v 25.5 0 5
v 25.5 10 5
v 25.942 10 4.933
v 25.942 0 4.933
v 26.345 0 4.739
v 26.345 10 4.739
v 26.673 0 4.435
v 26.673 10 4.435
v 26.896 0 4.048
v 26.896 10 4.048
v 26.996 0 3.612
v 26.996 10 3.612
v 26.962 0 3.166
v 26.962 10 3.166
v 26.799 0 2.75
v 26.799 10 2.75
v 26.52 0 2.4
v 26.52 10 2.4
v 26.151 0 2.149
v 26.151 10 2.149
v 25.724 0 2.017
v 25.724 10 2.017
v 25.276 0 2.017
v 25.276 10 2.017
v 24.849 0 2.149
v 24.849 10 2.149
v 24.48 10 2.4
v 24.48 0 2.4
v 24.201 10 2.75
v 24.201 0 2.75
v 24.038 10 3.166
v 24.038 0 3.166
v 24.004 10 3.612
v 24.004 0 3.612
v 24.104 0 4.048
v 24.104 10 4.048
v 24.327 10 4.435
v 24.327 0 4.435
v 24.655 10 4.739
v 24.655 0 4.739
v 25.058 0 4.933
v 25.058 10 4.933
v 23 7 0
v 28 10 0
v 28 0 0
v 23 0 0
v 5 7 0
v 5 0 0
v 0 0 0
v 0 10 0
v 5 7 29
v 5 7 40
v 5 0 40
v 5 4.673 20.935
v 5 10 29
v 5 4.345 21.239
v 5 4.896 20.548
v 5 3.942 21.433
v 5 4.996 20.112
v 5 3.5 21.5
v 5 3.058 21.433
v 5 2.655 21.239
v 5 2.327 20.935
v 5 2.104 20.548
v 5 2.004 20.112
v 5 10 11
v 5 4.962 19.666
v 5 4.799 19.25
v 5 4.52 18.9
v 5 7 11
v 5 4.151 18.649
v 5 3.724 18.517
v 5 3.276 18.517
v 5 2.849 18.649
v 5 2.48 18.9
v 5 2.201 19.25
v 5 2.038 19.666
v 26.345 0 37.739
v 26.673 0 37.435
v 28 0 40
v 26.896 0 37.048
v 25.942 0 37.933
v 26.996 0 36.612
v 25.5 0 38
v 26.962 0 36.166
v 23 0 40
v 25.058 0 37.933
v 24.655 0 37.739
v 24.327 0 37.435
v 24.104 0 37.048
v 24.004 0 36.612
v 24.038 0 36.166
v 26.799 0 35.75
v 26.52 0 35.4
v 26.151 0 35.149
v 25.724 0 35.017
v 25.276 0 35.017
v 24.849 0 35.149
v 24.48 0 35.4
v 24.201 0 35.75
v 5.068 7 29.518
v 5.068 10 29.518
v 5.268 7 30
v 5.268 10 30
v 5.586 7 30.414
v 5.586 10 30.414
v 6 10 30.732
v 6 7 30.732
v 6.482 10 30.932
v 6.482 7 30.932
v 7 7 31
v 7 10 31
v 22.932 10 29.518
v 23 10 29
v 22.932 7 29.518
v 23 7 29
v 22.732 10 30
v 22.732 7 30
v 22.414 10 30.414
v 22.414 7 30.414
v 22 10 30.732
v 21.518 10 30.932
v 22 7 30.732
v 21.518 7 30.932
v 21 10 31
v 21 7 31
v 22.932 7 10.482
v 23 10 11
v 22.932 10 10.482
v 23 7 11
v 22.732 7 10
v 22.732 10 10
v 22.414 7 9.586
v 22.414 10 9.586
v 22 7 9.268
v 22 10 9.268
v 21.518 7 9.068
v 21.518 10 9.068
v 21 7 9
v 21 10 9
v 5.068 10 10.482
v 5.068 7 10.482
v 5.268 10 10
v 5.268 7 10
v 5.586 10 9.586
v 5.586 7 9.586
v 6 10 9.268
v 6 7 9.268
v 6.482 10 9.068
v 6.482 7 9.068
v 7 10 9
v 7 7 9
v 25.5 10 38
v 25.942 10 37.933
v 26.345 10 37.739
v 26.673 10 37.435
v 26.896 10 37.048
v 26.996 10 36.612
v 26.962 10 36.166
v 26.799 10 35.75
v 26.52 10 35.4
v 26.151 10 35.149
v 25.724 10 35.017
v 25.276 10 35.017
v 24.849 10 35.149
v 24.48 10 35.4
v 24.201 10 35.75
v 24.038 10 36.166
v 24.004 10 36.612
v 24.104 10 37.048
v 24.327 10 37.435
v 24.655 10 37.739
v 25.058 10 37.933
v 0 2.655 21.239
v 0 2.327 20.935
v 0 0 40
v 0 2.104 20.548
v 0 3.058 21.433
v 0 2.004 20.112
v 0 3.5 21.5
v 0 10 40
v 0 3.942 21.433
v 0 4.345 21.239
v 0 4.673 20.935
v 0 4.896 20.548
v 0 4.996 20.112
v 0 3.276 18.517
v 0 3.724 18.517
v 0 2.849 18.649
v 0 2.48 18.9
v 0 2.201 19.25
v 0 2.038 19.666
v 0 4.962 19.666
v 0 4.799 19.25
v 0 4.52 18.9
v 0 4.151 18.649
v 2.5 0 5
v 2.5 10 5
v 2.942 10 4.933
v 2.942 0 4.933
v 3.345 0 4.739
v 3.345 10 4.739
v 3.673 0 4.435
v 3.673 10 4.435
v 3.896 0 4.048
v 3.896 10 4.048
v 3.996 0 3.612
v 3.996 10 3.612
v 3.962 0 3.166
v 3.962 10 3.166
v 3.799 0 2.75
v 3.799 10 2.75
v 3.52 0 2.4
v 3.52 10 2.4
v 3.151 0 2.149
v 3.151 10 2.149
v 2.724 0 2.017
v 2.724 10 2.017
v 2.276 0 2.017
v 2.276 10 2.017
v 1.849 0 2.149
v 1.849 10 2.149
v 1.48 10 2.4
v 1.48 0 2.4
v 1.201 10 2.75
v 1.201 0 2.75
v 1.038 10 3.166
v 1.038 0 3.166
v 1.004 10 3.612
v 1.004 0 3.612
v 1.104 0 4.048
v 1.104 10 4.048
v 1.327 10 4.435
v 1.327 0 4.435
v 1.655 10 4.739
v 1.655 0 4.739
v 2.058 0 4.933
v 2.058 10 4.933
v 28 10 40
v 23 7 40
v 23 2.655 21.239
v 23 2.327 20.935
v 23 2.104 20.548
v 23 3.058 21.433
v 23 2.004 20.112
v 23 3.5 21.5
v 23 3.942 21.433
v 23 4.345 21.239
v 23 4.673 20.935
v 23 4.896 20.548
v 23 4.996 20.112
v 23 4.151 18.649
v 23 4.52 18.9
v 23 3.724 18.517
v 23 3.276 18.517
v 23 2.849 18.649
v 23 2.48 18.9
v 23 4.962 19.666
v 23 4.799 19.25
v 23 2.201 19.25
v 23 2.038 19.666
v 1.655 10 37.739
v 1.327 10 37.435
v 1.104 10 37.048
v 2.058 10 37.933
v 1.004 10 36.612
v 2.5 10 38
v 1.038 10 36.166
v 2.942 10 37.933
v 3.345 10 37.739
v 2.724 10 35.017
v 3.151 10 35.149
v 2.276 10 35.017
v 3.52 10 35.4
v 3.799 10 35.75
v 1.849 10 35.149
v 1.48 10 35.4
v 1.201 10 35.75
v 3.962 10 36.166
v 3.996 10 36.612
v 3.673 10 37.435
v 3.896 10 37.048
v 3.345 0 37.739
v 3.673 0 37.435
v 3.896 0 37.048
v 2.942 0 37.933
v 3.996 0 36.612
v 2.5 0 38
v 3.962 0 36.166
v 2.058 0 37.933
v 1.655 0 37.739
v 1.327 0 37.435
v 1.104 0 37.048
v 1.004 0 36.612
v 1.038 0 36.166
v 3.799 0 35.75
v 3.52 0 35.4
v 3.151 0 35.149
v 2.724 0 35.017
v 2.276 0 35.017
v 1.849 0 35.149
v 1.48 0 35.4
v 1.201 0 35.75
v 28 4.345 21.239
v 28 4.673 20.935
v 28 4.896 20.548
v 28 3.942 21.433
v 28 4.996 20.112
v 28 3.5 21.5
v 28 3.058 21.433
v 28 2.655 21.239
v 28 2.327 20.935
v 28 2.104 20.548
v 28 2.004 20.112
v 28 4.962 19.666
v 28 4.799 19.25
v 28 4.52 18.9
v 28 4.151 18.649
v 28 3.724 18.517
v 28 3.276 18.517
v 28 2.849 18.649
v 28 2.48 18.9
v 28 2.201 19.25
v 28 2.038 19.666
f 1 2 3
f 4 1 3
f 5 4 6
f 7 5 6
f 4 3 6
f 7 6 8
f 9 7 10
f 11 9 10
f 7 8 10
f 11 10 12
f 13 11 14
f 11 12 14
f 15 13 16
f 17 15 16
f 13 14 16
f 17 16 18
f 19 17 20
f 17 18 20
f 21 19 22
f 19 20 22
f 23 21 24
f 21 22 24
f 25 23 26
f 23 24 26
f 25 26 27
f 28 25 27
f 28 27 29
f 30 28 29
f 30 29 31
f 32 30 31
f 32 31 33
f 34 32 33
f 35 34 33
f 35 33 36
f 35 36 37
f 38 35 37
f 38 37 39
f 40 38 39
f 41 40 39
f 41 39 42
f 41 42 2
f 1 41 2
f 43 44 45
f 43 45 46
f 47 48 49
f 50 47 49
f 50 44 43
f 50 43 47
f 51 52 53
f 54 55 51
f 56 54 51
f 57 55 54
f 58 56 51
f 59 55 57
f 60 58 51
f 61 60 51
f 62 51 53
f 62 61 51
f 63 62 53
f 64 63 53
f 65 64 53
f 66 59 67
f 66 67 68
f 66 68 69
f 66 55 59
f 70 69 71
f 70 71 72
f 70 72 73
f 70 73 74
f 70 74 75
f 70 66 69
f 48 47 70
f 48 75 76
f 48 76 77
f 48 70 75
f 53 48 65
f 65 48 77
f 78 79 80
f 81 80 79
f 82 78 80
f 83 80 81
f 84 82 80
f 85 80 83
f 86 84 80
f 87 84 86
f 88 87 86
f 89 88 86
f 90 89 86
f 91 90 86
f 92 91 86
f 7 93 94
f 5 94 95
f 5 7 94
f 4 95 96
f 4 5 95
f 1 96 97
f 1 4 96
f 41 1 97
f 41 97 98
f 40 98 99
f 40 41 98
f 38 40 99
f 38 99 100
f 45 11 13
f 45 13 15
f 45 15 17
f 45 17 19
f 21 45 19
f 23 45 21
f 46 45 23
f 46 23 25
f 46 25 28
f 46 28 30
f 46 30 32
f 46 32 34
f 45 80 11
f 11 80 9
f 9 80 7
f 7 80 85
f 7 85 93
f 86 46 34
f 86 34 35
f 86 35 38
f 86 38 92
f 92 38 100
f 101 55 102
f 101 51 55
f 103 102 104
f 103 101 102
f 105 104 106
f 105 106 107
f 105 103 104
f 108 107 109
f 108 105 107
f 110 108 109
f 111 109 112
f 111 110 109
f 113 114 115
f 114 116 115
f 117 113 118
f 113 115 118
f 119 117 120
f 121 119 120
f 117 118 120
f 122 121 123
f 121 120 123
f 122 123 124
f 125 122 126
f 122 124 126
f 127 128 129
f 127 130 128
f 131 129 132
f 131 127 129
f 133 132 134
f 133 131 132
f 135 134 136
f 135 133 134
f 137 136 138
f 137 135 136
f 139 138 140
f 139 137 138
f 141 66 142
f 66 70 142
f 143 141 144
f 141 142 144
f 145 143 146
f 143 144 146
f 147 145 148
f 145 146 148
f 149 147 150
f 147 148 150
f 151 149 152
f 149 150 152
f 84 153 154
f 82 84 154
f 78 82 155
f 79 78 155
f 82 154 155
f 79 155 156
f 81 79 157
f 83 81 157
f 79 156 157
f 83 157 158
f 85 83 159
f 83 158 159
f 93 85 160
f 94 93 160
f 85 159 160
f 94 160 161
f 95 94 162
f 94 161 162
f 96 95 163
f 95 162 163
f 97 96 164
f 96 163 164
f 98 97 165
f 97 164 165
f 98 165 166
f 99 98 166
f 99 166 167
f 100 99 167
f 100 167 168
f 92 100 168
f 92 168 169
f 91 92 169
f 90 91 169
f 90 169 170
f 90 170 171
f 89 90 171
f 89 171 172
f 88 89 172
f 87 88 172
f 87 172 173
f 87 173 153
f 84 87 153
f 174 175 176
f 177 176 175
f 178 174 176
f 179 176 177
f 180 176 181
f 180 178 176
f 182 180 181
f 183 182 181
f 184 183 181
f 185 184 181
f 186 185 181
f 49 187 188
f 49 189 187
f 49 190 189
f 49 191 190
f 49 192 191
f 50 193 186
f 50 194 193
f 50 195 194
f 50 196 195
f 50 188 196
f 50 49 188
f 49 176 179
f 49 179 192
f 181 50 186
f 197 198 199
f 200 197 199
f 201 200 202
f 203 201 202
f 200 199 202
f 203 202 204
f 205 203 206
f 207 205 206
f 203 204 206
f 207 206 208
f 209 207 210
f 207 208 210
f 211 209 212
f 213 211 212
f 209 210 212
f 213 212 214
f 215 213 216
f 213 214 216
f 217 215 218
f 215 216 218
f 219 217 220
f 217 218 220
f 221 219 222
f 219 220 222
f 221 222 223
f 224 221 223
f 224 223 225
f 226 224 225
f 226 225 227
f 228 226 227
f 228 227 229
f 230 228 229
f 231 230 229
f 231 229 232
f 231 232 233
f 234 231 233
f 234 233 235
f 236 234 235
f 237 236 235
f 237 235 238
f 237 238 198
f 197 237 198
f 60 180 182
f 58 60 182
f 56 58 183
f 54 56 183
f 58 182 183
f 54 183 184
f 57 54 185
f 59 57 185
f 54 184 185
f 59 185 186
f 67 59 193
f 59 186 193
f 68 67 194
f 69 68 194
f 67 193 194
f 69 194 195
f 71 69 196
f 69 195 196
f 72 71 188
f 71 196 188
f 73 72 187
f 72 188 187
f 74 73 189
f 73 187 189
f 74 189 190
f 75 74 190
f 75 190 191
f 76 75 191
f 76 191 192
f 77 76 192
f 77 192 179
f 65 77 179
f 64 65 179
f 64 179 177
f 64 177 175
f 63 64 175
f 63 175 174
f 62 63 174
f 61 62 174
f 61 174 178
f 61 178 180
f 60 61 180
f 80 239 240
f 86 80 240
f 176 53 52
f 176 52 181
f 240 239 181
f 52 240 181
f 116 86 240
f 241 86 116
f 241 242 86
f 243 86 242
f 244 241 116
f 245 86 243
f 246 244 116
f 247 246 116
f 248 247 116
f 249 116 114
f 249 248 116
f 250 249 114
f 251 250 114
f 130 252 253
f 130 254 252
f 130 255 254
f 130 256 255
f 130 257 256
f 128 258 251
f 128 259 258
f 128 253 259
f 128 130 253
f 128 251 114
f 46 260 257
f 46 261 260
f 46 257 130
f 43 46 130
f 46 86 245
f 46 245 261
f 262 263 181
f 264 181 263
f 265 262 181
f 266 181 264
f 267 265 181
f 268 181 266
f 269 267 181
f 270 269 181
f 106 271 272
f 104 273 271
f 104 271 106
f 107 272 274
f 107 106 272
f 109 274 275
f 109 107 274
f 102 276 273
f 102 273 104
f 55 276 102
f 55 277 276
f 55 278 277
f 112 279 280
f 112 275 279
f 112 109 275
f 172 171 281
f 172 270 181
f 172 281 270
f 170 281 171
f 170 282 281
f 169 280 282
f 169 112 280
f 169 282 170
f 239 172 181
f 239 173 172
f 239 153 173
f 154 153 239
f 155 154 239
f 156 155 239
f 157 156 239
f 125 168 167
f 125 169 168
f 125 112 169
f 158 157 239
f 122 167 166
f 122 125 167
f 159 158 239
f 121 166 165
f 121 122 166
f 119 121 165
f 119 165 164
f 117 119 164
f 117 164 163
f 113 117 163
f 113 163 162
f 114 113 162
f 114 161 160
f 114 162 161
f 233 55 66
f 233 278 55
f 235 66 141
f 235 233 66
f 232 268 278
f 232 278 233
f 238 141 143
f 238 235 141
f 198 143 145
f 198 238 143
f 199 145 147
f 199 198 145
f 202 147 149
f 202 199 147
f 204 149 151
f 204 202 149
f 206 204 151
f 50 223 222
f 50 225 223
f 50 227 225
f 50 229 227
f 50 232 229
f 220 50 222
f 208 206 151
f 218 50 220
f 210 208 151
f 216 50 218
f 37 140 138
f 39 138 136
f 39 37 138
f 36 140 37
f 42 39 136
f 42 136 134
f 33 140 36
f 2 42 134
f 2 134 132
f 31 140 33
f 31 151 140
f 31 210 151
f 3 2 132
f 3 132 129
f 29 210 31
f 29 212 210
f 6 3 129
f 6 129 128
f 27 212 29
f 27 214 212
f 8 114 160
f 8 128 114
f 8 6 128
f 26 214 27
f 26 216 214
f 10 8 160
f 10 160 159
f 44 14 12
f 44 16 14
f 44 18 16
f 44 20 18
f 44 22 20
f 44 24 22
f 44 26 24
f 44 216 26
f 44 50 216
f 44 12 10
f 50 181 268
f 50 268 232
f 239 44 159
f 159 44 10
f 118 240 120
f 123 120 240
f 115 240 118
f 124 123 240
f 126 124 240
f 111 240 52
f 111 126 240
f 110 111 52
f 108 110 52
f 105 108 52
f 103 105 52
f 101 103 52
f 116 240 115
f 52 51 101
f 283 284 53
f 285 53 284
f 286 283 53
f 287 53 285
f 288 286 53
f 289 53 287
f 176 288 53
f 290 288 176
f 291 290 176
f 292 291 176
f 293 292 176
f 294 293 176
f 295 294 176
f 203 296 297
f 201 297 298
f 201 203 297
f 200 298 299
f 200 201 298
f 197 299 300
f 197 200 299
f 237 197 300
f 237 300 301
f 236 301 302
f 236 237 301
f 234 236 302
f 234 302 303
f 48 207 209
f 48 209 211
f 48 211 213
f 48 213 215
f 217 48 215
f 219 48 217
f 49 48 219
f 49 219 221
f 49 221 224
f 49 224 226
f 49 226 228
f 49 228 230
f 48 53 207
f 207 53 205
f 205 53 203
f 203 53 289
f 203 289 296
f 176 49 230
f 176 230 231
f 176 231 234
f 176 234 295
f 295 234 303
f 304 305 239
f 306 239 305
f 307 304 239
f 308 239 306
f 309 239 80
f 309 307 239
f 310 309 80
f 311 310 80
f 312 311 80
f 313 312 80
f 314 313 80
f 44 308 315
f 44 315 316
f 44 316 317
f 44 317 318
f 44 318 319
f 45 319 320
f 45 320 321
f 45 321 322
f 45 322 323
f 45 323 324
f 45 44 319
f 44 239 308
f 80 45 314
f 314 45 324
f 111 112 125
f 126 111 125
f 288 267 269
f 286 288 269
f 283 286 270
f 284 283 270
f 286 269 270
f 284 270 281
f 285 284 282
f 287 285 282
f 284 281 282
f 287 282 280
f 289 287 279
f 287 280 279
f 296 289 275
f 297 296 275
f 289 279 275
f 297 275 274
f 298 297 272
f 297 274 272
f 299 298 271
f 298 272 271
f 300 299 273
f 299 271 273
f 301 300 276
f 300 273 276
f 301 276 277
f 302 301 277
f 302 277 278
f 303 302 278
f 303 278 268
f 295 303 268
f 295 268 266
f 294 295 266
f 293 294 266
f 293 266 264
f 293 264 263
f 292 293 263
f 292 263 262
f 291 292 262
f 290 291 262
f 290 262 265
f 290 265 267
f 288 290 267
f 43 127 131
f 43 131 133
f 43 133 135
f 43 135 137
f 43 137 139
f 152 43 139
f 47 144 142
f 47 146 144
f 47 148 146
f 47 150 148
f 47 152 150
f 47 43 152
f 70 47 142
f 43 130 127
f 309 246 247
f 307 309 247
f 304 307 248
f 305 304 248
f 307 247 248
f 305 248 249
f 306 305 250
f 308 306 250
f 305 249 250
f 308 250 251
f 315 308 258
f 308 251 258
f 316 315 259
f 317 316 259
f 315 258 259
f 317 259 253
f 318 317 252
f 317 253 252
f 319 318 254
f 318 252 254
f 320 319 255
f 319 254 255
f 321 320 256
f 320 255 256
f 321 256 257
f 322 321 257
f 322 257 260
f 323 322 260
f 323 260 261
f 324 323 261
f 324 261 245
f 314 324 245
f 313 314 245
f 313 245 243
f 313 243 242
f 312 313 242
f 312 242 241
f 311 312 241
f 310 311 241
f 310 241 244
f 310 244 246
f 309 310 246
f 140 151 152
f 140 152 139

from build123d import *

# Parameters (mm, degrees)
EXTRUDE_1_DEPTH     = 40
SKETCH_2_R          = 1.5
CUT_EXTRUDE_1_DEPTH = 40
SKETCH_3_R          = 1.5
CUT_EXTRUDE_2_DEPTH = 40
SKETCH_5_W          = 18
SKETCH_5_H          = 22
CUT_EXTRUDE_3_DEPTH = 50.839743178
FILLET_3_R          = 2


with BuildPart() as part:
    # 草图1 → 凸台-拉伸1 (new body)
    with BuildSketch(Plane.XY):
        Polygon((0, 0), (0, 10), (28, 10), (28, 0), (23, 0), (23, 7), (5, 7), (5, 0), align=None)
    extrude(amount=EXTRUDE_1_DEPTH)

    # 草图2 → 切除-拉伸1 (cut)
    with BuildSketch(Plane(origin=(0, 10, 0), x_dir=(1, 0, 0), z_dir=(0, 1, 0))):
        with Locations(Location((2.5, -3.5, 0), (0, 0, 270))):
            Circle(SKETCH_2_R)
        with Locations(Location((2.5, -36.5, 0), (0, 0, 270))):
            Circle(SKETCH_2_R)
        with Locations(Location((25.5, -36.5, 0), (0, 0, 270))):
            Circle(SKETCH_2_R)
        with Locations(Location((25.5, -3.5, 0), (0, 0, 270))):
            Circle(SKETCH_2_R)
    extrude(amount=-CUT_EXTRUDE_1_DEPTH, mode=Mode.SUBTRACT)

    # 草图3 → 切除-拉伸2 (cut)
    with BuildSketch(Plane.ZY):
        with Locations((20, 3.5)):
            Circle(SKETCH_3_R)
    extrude(amount=-CUT_EXTRUDE_2_DEPTH, mode=Mode.SUBTRACT)

    # 草图5 → 切除-拉伸3 (cut, through all)
    with BuildSketch(Plane(origin=(0, 10, 0), x_dir=(1, 0, 0), z_dir=(0, 1, 0))):
        with Locations((14, -20)):
            Rectangle(SKETCH_5_W, SKETCH_5_H)
    extrude(amount=-CUT_EXTRUDE_3_DEPTH, mode=Mode.SUBTRACT)

    # 圆角3
    fillet_3_edges = [part.edges().sort_by_distance(p)[0] for p in [
        (23, 8.5, 31),
        (5, 8.5, 9),
        (5, 8.5, 31),
        (23, 8.5, 9),
    ]]
    fillet(fillet_3_edges, radius=FILLET_3_R)


solid = part.part
